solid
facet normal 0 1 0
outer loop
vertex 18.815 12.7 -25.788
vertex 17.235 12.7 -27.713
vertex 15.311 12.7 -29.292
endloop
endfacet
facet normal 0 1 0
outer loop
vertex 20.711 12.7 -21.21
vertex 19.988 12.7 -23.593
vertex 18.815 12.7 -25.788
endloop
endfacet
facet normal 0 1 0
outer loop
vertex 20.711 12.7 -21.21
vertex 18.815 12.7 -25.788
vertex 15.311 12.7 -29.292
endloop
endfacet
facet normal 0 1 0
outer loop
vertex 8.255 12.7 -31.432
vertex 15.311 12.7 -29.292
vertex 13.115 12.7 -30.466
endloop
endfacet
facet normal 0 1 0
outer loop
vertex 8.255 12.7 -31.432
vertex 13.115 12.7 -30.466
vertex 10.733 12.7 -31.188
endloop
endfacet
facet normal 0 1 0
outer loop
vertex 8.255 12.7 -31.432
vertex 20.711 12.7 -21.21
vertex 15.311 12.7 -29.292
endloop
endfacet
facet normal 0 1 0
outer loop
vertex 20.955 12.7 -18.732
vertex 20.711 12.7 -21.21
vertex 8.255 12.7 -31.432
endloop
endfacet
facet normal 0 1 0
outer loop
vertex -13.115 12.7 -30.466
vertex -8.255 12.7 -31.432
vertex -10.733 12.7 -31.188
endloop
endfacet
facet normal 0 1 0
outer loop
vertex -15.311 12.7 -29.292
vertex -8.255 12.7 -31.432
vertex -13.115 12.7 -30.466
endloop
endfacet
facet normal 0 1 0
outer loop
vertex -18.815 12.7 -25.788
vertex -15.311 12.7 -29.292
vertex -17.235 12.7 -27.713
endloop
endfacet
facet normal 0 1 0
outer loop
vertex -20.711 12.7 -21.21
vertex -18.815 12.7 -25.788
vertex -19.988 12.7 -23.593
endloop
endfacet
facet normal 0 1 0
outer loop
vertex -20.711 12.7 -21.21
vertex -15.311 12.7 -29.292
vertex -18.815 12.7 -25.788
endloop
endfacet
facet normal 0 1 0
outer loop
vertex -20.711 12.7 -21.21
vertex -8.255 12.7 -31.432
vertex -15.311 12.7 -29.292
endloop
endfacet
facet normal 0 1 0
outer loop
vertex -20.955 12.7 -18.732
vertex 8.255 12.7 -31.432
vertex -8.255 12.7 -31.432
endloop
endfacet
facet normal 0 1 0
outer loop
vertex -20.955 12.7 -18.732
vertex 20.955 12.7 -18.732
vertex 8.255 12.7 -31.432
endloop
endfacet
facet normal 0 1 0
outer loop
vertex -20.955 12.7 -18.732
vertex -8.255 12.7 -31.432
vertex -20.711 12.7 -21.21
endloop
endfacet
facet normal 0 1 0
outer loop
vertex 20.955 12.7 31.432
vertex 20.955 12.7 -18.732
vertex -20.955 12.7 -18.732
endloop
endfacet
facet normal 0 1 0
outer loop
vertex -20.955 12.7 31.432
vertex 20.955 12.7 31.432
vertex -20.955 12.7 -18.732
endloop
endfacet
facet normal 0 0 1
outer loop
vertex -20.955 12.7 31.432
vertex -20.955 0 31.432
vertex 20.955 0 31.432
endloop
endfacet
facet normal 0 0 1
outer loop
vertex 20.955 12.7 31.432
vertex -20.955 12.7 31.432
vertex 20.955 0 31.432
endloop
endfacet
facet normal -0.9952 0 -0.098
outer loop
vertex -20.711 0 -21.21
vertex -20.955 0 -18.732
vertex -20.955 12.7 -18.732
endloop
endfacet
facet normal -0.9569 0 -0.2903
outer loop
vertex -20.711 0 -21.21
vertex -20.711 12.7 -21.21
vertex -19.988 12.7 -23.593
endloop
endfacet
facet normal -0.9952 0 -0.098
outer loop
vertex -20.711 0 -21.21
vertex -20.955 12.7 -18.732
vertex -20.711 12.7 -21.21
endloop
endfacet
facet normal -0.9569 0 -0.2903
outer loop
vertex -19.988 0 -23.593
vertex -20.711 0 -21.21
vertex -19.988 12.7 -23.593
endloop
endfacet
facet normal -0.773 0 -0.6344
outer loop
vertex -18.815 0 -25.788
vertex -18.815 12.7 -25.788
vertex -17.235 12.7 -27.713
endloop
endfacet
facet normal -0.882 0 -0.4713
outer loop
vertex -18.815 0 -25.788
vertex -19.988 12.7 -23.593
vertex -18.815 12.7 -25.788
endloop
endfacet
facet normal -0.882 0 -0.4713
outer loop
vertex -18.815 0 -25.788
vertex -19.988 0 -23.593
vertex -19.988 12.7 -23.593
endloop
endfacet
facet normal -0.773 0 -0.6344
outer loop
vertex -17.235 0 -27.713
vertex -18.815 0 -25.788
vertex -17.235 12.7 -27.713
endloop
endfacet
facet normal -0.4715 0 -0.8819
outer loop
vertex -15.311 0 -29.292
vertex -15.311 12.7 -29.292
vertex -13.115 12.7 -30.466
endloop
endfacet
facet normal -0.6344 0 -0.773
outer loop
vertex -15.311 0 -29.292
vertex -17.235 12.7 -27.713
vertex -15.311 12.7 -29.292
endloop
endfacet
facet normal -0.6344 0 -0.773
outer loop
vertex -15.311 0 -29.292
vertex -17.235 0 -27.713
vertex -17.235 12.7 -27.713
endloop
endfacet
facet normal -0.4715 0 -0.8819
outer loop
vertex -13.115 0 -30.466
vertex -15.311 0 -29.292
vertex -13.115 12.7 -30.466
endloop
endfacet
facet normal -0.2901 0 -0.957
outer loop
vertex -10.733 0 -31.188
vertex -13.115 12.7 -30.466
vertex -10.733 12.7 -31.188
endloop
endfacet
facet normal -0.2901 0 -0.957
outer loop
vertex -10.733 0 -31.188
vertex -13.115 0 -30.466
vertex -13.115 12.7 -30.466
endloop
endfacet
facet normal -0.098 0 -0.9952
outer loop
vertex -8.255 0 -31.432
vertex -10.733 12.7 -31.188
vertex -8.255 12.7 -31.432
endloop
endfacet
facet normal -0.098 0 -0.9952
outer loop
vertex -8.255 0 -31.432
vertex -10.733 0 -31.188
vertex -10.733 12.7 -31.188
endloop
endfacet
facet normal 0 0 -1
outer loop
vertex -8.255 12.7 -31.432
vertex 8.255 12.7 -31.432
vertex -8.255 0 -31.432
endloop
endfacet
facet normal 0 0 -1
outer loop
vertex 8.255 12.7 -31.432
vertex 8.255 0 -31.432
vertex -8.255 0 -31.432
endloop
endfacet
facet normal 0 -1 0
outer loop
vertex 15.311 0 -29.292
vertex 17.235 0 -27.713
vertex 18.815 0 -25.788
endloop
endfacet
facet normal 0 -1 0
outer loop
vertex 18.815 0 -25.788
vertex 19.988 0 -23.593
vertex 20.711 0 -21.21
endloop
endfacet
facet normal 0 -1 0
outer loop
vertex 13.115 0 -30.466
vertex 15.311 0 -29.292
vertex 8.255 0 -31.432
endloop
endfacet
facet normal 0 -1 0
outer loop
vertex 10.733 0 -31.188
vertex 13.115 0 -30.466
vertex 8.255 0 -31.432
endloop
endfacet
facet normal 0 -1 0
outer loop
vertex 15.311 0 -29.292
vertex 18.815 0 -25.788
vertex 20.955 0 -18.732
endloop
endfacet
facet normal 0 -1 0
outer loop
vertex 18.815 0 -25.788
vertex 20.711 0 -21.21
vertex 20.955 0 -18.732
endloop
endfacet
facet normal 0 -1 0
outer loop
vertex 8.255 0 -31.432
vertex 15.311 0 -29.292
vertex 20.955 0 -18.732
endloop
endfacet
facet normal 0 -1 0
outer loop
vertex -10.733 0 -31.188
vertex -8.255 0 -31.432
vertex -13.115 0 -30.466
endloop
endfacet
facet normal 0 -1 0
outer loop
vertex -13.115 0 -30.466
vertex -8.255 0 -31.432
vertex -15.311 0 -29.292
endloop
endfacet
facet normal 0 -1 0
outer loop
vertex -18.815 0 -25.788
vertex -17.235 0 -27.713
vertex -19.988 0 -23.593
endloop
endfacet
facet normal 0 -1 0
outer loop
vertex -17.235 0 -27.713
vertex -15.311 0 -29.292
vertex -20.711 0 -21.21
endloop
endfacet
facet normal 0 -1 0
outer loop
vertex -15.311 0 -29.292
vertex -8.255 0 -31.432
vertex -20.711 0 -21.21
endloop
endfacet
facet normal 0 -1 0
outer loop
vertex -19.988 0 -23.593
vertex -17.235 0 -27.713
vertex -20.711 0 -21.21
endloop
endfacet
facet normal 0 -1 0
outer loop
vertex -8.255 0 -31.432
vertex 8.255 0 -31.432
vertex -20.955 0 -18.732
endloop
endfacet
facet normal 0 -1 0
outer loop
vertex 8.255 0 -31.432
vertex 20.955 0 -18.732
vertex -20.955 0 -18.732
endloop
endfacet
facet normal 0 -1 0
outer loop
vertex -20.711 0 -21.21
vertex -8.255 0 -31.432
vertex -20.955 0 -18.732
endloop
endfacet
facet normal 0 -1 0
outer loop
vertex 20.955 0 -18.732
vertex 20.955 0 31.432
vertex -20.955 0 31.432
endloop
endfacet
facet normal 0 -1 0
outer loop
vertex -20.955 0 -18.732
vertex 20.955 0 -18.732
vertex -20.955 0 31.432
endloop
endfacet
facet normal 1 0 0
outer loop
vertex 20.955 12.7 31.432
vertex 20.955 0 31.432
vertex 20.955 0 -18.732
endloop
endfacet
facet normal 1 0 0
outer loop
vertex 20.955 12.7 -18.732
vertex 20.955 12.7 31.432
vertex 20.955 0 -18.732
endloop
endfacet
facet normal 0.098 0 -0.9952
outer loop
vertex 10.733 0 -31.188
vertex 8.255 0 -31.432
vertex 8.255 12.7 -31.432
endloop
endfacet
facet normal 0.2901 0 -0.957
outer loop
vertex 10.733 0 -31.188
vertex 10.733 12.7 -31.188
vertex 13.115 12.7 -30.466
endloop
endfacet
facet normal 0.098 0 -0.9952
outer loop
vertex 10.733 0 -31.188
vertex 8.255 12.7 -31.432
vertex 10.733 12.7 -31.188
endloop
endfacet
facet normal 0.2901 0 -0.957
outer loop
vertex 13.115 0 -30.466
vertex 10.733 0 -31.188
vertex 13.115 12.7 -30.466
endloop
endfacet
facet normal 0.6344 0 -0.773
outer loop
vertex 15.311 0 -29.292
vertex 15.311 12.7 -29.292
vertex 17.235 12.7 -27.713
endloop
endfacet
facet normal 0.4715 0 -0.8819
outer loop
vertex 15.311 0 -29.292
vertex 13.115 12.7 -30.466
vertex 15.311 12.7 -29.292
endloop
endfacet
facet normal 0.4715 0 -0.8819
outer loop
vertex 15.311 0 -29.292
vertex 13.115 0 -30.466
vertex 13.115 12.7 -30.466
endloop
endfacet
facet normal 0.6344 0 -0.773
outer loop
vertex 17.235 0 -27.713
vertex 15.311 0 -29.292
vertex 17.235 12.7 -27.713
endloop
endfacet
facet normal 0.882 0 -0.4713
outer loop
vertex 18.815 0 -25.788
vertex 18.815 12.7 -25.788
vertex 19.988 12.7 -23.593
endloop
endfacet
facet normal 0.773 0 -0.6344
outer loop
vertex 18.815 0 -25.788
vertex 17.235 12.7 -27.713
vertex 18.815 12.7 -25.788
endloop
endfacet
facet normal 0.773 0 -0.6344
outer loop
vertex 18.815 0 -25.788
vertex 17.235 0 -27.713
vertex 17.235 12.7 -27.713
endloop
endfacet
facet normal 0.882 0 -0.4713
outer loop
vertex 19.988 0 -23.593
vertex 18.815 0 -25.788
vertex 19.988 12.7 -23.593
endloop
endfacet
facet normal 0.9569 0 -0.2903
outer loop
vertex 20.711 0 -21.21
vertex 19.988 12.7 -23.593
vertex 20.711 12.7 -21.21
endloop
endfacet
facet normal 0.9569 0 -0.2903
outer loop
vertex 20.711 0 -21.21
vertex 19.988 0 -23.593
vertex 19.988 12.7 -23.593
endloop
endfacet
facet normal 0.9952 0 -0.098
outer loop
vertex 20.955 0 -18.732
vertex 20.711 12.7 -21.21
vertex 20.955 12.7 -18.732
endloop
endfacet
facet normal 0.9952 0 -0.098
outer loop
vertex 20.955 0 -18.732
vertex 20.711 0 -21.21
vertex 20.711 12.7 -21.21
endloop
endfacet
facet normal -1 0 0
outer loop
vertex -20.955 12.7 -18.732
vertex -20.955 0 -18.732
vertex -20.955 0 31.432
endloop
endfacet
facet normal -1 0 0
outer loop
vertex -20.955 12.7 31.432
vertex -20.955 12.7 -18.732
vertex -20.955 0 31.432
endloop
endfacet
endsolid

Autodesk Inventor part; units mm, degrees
ref_plane "YZ Plane" through (0, 0, 0) normal (1, 0, 0) x (0, 1, 0)
ref_plane "XZ Plane" through (0, 0, 0) normal (0, 1, 0) x (-1, 0, 0)
ref_plane "XY Plane" through (0, 0, 0) normal (0, 0, 1) x (1, 0, 0)
sketch "Sketch1" plane through (0, 0, 0) normal (0, 1, 0) x (-1, 0, 0)
  line L0 (-8.255, -31.4325) -> (8.255, -31.4325)
  line L1 (20.955, -18.7325) -> (20.955, 31.4325)
  line L2 (20.955, 31.4325) -> (-20.955, 31.4325)
  line L3 (-20.955, 31.4325) -> (-20.955, -18.7325)
  line L4 (-20.955, -31.4325) -> (20.955, 31.4325) construction
  line L5 (20.955, -31.4325) -> (-20.955, 31.4325) construction
  arc A0 (8.255, -31.4325) -> (20.955, -18.7325) centre (8.255, -18.7325) ccw
  arc A1 (-20.955, -18.7325) -> (-8.255, -31.4325) centre (-8.255, -18.7325) ccw
  point P0 (0, 0)
  dimension "d0" = 62.865
  dimension "d1" = 41.91
  dimension "d2" = 12.7
extrude "Extrusion1" add sketch "Sketch1" along normal blind 12.7
properties part number "Fixture_Airpot_Support_2"
